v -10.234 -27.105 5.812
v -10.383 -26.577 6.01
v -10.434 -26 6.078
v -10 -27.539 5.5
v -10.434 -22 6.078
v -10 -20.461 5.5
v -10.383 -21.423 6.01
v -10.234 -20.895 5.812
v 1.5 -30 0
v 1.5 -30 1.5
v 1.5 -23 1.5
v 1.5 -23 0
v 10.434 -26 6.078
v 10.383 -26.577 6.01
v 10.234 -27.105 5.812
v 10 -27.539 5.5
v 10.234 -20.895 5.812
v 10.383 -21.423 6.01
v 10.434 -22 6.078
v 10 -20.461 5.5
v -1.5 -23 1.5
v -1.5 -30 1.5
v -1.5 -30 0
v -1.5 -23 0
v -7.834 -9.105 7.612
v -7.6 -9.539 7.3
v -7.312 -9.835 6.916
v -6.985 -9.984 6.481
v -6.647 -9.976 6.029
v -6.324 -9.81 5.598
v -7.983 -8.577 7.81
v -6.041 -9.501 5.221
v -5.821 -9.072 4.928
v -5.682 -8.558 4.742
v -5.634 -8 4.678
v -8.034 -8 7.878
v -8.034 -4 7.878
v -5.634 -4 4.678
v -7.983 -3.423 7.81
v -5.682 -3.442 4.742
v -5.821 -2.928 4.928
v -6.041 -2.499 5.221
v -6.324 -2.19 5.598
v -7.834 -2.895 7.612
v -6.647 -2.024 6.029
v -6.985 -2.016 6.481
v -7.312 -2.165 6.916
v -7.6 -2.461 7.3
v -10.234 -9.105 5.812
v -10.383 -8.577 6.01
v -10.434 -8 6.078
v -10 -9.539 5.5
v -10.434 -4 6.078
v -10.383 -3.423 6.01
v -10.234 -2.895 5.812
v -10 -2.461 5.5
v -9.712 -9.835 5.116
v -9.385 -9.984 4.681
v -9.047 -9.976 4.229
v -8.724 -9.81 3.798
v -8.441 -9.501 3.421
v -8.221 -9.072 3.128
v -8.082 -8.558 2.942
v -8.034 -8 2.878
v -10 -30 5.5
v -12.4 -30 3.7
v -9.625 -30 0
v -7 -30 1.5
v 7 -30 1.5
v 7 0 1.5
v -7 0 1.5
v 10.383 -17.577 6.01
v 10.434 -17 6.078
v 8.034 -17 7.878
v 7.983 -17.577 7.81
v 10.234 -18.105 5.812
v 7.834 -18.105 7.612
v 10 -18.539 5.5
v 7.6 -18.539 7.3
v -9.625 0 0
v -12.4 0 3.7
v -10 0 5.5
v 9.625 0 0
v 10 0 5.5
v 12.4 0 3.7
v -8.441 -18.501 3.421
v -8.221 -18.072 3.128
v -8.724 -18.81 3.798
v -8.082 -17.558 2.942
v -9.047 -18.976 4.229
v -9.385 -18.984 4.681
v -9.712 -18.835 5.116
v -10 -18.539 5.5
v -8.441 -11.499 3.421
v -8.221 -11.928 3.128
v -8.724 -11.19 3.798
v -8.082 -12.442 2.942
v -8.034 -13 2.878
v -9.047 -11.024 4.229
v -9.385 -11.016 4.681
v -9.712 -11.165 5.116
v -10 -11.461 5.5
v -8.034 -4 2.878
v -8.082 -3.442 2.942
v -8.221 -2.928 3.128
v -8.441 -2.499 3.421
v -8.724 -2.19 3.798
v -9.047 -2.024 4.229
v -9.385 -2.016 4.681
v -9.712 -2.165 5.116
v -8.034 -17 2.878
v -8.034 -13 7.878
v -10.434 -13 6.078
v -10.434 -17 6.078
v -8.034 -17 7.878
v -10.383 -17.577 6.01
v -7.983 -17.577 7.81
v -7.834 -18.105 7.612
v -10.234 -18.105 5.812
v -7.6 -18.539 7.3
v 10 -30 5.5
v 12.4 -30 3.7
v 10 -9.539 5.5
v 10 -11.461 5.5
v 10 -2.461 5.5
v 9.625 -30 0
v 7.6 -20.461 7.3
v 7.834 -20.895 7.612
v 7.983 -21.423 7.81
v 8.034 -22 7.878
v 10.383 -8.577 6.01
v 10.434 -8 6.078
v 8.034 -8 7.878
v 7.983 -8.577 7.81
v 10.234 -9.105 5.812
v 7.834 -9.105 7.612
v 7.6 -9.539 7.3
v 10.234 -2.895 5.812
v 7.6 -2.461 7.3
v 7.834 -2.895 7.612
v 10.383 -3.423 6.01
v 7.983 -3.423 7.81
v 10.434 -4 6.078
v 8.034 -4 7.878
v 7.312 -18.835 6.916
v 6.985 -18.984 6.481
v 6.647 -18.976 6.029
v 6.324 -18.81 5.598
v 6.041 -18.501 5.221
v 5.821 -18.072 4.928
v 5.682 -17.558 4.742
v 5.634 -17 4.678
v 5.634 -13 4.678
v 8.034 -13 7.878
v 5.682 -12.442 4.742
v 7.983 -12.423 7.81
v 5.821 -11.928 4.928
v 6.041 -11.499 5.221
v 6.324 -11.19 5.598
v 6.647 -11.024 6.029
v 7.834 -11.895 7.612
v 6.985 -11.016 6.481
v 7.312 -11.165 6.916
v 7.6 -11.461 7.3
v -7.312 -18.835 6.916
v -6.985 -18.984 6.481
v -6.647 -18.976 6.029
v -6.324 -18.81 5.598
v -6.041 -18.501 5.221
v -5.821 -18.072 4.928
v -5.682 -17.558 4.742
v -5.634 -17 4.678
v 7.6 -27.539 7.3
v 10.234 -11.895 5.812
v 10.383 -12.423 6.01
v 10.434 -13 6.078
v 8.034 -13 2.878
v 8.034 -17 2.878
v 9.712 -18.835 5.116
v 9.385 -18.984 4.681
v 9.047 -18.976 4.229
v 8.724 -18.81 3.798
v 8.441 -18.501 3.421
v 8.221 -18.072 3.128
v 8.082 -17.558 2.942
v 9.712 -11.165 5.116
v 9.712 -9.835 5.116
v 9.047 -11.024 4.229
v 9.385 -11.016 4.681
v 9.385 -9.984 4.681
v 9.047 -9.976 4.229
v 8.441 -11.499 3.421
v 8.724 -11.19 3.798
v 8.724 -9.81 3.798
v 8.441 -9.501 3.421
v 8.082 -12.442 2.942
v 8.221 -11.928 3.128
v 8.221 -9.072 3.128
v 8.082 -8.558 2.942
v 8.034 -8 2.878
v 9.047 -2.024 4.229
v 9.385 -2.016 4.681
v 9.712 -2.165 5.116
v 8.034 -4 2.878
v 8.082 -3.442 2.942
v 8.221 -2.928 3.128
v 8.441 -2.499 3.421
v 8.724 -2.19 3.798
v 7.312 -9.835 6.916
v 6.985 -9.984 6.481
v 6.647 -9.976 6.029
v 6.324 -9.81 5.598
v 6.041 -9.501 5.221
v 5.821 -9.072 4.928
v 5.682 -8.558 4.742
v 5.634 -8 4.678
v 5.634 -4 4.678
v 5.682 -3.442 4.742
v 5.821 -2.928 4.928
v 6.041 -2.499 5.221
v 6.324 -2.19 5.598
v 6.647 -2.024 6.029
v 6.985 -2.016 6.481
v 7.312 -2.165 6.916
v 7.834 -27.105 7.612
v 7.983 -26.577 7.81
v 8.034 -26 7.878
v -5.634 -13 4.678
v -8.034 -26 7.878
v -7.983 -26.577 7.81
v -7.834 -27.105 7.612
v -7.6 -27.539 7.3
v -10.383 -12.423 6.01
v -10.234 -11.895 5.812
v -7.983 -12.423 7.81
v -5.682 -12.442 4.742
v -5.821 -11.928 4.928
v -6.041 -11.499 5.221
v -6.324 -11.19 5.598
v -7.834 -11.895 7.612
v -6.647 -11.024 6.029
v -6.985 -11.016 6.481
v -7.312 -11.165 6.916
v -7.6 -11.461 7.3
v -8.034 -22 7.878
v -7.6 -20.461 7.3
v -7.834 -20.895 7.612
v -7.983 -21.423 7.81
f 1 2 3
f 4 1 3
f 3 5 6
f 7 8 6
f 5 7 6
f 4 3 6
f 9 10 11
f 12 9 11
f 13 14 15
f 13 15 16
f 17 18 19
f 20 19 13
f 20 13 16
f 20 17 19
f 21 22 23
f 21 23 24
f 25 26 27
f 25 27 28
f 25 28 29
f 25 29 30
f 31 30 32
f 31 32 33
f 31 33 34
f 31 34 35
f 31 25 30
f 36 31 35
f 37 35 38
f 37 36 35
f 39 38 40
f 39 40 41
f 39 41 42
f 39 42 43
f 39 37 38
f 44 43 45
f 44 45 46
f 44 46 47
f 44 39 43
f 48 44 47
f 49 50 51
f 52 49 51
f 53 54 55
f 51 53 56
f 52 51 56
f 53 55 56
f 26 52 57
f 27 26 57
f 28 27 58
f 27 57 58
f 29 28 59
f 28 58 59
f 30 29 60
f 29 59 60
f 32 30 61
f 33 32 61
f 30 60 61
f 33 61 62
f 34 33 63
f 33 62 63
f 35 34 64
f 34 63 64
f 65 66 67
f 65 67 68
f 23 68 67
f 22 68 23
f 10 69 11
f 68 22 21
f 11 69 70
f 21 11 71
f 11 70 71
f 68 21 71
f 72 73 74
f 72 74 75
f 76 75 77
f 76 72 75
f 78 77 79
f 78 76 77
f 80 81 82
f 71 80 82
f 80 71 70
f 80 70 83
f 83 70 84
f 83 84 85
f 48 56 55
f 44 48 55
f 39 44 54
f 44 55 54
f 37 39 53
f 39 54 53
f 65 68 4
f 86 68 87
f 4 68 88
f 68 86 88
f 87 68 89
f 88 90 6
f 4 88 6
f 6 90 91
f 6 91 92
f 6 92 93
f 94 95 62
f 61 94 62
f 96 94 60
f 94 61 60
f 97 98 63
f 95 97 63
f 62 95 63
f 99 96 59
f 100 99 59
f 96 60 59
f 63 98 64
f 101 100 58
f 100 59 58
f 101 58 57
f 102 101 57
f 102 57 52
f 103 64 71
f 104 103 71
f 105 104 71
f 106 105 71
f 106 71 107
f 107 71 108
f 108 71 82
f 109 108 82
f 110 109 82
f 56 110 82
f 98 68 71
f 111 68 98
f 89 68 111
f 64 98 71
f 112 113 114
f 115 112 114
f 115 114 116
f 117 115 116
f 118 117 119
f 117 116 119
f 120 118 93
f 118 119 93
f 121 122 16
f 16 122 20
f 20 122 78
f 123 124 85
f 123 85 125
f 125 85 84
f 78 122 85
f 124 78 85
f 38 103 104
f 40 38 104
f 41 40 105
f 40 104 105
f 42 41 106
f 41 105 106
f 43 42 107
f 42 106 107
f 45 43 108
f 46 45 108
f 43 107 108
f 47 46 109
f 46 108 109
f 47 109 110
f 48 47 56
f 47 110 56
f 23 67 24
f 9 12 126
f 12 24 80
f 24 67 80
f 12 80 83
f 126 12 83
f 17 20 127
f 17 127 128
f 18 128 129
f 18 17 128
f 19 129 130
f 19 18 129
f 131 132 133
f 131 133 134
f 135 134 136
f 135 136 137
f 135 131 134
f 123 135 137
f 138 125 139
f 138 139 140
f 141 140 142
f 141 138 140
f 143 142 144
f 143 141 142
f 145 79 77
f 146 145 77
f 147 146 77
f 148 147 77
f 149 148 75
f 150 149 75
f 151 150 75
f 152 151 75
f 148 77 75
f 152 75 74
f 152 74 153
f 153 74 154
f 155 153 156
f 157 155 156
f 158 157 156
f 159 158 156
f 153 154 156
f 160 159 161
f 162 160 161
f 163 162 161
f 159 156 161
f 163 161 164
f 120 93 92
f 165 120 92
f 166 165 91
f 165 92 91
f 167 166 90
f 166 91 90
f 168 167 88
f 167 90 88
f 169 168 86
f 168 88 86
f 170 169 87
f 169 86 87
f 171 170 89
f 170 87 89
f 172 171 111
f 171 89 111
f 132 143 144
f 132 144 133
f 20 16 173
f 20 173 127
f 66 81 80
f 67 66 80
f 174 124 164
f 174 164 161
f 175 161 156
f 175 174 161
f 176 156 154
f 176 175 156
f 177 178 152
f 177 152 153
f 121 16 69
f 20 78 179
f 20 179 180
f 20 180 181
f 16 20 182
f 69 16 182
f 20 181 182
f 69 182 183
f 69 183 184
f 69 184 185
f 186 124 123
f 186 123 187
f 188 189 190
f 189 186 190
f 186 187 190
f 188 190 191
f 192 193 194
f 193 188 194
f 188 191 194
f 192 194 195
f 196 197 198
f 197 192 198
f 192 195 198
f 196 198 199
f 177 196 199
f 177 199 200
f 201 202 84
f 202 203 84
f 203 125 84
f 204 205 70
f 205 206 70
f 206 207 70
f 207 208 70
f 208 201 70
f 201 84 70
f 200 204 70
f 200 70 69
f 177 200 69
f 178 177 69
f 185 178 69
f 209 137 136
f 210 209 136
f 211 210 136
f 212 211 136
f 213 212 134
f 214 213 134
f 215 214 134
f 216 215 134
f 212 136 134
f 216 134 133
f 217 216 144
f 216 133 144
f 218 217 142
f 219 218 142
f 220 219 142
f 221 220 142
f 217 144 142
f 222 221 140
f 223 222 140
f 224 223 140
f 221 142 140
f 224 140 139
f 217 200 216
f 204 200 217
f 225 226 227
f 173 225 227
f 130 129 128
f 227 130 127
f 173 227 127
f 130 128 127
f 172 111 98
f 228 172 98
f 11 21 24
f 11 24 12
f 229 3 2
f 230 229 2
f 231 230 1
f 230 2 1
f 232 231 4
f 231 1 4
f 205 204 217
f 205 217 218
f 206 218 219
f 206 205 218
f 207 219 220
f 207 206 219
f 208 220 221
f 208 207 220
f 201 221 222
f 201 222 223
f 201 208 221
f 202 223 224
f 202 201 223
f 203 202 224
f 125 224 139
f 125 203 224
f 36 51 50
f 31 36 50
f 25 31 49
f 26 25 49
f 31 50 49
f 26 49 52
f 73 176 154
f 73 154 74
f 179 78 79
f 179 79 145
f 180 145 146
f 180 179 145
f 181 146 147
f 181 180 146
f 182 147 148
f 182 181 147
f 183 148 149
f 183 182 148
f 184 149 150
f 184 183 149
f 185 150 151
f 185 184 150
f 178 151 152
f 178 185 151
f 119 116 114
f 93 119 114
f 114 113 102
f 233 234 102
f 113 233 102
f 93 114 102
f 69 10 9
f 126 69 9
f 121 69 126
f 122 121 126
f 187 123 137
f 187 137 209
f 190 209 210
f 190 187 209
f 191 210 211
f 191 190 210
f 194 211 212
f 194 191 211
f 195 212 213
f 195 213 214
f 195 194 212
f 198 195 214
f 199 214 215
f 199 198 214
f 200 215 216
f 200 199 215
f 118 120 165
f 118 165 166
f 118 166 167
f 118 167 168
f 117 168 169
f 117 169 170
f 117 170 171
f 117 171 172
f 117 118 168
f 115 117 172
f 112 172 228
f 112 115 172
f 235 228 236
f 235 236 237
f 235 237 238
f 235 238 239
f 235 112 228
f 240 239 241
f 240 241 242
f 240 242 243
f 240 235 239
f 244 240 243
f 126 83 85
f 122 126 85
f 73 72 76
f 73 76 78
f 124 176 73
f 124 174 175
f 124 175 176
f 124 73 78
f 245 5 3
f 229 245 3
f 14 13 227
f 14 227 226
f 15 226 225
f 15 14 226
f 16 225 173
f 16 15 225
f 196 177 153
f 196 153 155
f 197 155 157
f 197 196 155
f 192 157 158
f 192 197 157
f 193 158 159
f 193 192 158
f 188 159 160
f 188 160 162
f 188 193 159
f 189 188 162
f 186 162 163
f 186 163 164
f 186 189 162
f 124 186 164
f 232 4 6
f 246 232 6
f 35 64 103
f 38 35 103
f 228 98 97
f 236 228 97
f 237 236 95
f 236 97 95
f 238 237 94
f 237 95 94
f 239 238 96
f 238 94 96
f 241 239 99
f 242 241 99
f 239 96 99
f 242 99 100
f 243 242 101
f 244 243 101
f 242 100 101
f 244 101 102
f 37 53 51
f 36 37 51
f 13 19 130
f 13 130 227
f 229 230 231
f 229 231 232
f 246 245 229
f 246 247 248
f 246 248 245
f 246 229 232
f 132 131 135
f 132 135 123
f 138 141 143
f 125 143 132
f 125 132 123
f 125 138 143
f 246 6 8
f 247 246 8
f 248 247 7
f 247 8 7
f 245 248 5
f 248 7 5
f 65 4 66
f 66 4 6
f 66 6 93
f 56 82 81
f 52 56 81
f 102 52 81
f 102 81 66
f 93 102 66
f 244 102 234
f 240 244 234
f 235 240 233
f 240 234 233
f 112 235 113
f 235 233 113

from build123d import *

# Parameters (mm, degrees)
F1_DEPTH = 30
F2_W     = 3
F2_H     = 7
F3_DEPTH = 25.4
F5_DEPTH = 3


with BuildPart() as f1:
    # F0 (on Front) → F1 (new body)
    with BuildSketch(Plane.XZ):
        Polygon((-12.4, 3.7), (-9.625, 0), (9.625, 0), (12.4, 3.7), (10, 5.5), (7, 1.5), (-7, 1.5), (-10, 5.5), align=None)
    extrude(amount=F1_DEPTH)

    # F2 (on face) → F3 (cut)
    with BuildSketch(Plane.XY.offset(1.5)):
        with Locations((0, -26.5)):
            Rectangle(F2_W, F2_H)
    extrude(amount=-F3_DEPTH, mode=Mode.SUBTRACT)

    # F4 (on face) → F5 (join)
    with BuildSketch(Plane(origin=(-3.76, 0, -2.82), x_dir=(0, 1, 0), z_dir=(0.8, 0, 0.6))):
        with BuildLine():
            ThreePointArc((-8, 11.1230850667), (-8.8503440872, 10.9333101724), (-9.5393142152, 10.4))
            Line((-9.5393142152, 10.4), (-2.4606857848, 10.4))
            ThreePointArc((-2.4606857848, 10.4), (-3.1496559128, 10.9333101724), (-4, 11.1230850667))
            Line((-4, 11.1230850667), (-8, 11.1230850667))
        make_face()
        with BuildLine():
            Line((-2.4606857848, 10.4), (-9.5393142152, 10.4))
            ThreePointArc((-9.5393142152, 10.4), (-9.8102251057, 8.2727409795), (-8, 7.1230850667))
            Line((-8, 7.1230850667), (-4, 7.1230850667))
            ThreePointArc((-4, 7.1230850667), (-2.1897748943, 8.2727409795), (-2.4606857848, 10.4))
        make_face()
        with BuildLine():
            ThreePointArc((-17, 11.1230850667), (-17.8503440872, 10.9333101724), (-18.5393142152, 10.4))
            Line((-18.5393142152, 10.4), (-11.4606857848, 10.4))
            ThreePointArc((-11.4606857848, 10.4), (-12.1496559128, 10.9333101724), (-13, 11.1230850667))
            Line((-13, 11.1230850667), (-17, 11.1230850667))
        make_face()
        with BuildLine():
            Line((-11.4606857848, 10.4), (-18.5393142152, 10.4))
            ThreePointArc((-18.5393142152, 10.4), (-18.8102251057, 8.2727409795), (-17, 7.1230850667))
            Line((-17, 7.1230850667), (-13, 7.1230850667))
            ThreePointArc((-13, 7.1230850667), (-11.1897748943, 8.2727409795), (-11.4606857848, 10.4))
        make_face()
        with BuildLine():
            Line((-22, 11.1230850667), (-26, 11.1230850667))
            ThreePointArc((-26, 11.1230850667), (-26.8503440872, 10.9333101724), (-27.5393142152, 10.4))
            Line((-27.5393142152, 10.4), (-20.4606857848, 10.4))
            ThreePointArc((-20.4606857848, 10.4), (-21.1496559128, 10.9333101724), (-22, 11.1230850667))
        make_face()
    extrude(amount=F5_DEPTH)

    # F6: F1 across plane


with BuildPart() as f1_1:
    add(f1.part)
    add(f1.part.mirror(Plane.YZ))


solid = f1_1.part
